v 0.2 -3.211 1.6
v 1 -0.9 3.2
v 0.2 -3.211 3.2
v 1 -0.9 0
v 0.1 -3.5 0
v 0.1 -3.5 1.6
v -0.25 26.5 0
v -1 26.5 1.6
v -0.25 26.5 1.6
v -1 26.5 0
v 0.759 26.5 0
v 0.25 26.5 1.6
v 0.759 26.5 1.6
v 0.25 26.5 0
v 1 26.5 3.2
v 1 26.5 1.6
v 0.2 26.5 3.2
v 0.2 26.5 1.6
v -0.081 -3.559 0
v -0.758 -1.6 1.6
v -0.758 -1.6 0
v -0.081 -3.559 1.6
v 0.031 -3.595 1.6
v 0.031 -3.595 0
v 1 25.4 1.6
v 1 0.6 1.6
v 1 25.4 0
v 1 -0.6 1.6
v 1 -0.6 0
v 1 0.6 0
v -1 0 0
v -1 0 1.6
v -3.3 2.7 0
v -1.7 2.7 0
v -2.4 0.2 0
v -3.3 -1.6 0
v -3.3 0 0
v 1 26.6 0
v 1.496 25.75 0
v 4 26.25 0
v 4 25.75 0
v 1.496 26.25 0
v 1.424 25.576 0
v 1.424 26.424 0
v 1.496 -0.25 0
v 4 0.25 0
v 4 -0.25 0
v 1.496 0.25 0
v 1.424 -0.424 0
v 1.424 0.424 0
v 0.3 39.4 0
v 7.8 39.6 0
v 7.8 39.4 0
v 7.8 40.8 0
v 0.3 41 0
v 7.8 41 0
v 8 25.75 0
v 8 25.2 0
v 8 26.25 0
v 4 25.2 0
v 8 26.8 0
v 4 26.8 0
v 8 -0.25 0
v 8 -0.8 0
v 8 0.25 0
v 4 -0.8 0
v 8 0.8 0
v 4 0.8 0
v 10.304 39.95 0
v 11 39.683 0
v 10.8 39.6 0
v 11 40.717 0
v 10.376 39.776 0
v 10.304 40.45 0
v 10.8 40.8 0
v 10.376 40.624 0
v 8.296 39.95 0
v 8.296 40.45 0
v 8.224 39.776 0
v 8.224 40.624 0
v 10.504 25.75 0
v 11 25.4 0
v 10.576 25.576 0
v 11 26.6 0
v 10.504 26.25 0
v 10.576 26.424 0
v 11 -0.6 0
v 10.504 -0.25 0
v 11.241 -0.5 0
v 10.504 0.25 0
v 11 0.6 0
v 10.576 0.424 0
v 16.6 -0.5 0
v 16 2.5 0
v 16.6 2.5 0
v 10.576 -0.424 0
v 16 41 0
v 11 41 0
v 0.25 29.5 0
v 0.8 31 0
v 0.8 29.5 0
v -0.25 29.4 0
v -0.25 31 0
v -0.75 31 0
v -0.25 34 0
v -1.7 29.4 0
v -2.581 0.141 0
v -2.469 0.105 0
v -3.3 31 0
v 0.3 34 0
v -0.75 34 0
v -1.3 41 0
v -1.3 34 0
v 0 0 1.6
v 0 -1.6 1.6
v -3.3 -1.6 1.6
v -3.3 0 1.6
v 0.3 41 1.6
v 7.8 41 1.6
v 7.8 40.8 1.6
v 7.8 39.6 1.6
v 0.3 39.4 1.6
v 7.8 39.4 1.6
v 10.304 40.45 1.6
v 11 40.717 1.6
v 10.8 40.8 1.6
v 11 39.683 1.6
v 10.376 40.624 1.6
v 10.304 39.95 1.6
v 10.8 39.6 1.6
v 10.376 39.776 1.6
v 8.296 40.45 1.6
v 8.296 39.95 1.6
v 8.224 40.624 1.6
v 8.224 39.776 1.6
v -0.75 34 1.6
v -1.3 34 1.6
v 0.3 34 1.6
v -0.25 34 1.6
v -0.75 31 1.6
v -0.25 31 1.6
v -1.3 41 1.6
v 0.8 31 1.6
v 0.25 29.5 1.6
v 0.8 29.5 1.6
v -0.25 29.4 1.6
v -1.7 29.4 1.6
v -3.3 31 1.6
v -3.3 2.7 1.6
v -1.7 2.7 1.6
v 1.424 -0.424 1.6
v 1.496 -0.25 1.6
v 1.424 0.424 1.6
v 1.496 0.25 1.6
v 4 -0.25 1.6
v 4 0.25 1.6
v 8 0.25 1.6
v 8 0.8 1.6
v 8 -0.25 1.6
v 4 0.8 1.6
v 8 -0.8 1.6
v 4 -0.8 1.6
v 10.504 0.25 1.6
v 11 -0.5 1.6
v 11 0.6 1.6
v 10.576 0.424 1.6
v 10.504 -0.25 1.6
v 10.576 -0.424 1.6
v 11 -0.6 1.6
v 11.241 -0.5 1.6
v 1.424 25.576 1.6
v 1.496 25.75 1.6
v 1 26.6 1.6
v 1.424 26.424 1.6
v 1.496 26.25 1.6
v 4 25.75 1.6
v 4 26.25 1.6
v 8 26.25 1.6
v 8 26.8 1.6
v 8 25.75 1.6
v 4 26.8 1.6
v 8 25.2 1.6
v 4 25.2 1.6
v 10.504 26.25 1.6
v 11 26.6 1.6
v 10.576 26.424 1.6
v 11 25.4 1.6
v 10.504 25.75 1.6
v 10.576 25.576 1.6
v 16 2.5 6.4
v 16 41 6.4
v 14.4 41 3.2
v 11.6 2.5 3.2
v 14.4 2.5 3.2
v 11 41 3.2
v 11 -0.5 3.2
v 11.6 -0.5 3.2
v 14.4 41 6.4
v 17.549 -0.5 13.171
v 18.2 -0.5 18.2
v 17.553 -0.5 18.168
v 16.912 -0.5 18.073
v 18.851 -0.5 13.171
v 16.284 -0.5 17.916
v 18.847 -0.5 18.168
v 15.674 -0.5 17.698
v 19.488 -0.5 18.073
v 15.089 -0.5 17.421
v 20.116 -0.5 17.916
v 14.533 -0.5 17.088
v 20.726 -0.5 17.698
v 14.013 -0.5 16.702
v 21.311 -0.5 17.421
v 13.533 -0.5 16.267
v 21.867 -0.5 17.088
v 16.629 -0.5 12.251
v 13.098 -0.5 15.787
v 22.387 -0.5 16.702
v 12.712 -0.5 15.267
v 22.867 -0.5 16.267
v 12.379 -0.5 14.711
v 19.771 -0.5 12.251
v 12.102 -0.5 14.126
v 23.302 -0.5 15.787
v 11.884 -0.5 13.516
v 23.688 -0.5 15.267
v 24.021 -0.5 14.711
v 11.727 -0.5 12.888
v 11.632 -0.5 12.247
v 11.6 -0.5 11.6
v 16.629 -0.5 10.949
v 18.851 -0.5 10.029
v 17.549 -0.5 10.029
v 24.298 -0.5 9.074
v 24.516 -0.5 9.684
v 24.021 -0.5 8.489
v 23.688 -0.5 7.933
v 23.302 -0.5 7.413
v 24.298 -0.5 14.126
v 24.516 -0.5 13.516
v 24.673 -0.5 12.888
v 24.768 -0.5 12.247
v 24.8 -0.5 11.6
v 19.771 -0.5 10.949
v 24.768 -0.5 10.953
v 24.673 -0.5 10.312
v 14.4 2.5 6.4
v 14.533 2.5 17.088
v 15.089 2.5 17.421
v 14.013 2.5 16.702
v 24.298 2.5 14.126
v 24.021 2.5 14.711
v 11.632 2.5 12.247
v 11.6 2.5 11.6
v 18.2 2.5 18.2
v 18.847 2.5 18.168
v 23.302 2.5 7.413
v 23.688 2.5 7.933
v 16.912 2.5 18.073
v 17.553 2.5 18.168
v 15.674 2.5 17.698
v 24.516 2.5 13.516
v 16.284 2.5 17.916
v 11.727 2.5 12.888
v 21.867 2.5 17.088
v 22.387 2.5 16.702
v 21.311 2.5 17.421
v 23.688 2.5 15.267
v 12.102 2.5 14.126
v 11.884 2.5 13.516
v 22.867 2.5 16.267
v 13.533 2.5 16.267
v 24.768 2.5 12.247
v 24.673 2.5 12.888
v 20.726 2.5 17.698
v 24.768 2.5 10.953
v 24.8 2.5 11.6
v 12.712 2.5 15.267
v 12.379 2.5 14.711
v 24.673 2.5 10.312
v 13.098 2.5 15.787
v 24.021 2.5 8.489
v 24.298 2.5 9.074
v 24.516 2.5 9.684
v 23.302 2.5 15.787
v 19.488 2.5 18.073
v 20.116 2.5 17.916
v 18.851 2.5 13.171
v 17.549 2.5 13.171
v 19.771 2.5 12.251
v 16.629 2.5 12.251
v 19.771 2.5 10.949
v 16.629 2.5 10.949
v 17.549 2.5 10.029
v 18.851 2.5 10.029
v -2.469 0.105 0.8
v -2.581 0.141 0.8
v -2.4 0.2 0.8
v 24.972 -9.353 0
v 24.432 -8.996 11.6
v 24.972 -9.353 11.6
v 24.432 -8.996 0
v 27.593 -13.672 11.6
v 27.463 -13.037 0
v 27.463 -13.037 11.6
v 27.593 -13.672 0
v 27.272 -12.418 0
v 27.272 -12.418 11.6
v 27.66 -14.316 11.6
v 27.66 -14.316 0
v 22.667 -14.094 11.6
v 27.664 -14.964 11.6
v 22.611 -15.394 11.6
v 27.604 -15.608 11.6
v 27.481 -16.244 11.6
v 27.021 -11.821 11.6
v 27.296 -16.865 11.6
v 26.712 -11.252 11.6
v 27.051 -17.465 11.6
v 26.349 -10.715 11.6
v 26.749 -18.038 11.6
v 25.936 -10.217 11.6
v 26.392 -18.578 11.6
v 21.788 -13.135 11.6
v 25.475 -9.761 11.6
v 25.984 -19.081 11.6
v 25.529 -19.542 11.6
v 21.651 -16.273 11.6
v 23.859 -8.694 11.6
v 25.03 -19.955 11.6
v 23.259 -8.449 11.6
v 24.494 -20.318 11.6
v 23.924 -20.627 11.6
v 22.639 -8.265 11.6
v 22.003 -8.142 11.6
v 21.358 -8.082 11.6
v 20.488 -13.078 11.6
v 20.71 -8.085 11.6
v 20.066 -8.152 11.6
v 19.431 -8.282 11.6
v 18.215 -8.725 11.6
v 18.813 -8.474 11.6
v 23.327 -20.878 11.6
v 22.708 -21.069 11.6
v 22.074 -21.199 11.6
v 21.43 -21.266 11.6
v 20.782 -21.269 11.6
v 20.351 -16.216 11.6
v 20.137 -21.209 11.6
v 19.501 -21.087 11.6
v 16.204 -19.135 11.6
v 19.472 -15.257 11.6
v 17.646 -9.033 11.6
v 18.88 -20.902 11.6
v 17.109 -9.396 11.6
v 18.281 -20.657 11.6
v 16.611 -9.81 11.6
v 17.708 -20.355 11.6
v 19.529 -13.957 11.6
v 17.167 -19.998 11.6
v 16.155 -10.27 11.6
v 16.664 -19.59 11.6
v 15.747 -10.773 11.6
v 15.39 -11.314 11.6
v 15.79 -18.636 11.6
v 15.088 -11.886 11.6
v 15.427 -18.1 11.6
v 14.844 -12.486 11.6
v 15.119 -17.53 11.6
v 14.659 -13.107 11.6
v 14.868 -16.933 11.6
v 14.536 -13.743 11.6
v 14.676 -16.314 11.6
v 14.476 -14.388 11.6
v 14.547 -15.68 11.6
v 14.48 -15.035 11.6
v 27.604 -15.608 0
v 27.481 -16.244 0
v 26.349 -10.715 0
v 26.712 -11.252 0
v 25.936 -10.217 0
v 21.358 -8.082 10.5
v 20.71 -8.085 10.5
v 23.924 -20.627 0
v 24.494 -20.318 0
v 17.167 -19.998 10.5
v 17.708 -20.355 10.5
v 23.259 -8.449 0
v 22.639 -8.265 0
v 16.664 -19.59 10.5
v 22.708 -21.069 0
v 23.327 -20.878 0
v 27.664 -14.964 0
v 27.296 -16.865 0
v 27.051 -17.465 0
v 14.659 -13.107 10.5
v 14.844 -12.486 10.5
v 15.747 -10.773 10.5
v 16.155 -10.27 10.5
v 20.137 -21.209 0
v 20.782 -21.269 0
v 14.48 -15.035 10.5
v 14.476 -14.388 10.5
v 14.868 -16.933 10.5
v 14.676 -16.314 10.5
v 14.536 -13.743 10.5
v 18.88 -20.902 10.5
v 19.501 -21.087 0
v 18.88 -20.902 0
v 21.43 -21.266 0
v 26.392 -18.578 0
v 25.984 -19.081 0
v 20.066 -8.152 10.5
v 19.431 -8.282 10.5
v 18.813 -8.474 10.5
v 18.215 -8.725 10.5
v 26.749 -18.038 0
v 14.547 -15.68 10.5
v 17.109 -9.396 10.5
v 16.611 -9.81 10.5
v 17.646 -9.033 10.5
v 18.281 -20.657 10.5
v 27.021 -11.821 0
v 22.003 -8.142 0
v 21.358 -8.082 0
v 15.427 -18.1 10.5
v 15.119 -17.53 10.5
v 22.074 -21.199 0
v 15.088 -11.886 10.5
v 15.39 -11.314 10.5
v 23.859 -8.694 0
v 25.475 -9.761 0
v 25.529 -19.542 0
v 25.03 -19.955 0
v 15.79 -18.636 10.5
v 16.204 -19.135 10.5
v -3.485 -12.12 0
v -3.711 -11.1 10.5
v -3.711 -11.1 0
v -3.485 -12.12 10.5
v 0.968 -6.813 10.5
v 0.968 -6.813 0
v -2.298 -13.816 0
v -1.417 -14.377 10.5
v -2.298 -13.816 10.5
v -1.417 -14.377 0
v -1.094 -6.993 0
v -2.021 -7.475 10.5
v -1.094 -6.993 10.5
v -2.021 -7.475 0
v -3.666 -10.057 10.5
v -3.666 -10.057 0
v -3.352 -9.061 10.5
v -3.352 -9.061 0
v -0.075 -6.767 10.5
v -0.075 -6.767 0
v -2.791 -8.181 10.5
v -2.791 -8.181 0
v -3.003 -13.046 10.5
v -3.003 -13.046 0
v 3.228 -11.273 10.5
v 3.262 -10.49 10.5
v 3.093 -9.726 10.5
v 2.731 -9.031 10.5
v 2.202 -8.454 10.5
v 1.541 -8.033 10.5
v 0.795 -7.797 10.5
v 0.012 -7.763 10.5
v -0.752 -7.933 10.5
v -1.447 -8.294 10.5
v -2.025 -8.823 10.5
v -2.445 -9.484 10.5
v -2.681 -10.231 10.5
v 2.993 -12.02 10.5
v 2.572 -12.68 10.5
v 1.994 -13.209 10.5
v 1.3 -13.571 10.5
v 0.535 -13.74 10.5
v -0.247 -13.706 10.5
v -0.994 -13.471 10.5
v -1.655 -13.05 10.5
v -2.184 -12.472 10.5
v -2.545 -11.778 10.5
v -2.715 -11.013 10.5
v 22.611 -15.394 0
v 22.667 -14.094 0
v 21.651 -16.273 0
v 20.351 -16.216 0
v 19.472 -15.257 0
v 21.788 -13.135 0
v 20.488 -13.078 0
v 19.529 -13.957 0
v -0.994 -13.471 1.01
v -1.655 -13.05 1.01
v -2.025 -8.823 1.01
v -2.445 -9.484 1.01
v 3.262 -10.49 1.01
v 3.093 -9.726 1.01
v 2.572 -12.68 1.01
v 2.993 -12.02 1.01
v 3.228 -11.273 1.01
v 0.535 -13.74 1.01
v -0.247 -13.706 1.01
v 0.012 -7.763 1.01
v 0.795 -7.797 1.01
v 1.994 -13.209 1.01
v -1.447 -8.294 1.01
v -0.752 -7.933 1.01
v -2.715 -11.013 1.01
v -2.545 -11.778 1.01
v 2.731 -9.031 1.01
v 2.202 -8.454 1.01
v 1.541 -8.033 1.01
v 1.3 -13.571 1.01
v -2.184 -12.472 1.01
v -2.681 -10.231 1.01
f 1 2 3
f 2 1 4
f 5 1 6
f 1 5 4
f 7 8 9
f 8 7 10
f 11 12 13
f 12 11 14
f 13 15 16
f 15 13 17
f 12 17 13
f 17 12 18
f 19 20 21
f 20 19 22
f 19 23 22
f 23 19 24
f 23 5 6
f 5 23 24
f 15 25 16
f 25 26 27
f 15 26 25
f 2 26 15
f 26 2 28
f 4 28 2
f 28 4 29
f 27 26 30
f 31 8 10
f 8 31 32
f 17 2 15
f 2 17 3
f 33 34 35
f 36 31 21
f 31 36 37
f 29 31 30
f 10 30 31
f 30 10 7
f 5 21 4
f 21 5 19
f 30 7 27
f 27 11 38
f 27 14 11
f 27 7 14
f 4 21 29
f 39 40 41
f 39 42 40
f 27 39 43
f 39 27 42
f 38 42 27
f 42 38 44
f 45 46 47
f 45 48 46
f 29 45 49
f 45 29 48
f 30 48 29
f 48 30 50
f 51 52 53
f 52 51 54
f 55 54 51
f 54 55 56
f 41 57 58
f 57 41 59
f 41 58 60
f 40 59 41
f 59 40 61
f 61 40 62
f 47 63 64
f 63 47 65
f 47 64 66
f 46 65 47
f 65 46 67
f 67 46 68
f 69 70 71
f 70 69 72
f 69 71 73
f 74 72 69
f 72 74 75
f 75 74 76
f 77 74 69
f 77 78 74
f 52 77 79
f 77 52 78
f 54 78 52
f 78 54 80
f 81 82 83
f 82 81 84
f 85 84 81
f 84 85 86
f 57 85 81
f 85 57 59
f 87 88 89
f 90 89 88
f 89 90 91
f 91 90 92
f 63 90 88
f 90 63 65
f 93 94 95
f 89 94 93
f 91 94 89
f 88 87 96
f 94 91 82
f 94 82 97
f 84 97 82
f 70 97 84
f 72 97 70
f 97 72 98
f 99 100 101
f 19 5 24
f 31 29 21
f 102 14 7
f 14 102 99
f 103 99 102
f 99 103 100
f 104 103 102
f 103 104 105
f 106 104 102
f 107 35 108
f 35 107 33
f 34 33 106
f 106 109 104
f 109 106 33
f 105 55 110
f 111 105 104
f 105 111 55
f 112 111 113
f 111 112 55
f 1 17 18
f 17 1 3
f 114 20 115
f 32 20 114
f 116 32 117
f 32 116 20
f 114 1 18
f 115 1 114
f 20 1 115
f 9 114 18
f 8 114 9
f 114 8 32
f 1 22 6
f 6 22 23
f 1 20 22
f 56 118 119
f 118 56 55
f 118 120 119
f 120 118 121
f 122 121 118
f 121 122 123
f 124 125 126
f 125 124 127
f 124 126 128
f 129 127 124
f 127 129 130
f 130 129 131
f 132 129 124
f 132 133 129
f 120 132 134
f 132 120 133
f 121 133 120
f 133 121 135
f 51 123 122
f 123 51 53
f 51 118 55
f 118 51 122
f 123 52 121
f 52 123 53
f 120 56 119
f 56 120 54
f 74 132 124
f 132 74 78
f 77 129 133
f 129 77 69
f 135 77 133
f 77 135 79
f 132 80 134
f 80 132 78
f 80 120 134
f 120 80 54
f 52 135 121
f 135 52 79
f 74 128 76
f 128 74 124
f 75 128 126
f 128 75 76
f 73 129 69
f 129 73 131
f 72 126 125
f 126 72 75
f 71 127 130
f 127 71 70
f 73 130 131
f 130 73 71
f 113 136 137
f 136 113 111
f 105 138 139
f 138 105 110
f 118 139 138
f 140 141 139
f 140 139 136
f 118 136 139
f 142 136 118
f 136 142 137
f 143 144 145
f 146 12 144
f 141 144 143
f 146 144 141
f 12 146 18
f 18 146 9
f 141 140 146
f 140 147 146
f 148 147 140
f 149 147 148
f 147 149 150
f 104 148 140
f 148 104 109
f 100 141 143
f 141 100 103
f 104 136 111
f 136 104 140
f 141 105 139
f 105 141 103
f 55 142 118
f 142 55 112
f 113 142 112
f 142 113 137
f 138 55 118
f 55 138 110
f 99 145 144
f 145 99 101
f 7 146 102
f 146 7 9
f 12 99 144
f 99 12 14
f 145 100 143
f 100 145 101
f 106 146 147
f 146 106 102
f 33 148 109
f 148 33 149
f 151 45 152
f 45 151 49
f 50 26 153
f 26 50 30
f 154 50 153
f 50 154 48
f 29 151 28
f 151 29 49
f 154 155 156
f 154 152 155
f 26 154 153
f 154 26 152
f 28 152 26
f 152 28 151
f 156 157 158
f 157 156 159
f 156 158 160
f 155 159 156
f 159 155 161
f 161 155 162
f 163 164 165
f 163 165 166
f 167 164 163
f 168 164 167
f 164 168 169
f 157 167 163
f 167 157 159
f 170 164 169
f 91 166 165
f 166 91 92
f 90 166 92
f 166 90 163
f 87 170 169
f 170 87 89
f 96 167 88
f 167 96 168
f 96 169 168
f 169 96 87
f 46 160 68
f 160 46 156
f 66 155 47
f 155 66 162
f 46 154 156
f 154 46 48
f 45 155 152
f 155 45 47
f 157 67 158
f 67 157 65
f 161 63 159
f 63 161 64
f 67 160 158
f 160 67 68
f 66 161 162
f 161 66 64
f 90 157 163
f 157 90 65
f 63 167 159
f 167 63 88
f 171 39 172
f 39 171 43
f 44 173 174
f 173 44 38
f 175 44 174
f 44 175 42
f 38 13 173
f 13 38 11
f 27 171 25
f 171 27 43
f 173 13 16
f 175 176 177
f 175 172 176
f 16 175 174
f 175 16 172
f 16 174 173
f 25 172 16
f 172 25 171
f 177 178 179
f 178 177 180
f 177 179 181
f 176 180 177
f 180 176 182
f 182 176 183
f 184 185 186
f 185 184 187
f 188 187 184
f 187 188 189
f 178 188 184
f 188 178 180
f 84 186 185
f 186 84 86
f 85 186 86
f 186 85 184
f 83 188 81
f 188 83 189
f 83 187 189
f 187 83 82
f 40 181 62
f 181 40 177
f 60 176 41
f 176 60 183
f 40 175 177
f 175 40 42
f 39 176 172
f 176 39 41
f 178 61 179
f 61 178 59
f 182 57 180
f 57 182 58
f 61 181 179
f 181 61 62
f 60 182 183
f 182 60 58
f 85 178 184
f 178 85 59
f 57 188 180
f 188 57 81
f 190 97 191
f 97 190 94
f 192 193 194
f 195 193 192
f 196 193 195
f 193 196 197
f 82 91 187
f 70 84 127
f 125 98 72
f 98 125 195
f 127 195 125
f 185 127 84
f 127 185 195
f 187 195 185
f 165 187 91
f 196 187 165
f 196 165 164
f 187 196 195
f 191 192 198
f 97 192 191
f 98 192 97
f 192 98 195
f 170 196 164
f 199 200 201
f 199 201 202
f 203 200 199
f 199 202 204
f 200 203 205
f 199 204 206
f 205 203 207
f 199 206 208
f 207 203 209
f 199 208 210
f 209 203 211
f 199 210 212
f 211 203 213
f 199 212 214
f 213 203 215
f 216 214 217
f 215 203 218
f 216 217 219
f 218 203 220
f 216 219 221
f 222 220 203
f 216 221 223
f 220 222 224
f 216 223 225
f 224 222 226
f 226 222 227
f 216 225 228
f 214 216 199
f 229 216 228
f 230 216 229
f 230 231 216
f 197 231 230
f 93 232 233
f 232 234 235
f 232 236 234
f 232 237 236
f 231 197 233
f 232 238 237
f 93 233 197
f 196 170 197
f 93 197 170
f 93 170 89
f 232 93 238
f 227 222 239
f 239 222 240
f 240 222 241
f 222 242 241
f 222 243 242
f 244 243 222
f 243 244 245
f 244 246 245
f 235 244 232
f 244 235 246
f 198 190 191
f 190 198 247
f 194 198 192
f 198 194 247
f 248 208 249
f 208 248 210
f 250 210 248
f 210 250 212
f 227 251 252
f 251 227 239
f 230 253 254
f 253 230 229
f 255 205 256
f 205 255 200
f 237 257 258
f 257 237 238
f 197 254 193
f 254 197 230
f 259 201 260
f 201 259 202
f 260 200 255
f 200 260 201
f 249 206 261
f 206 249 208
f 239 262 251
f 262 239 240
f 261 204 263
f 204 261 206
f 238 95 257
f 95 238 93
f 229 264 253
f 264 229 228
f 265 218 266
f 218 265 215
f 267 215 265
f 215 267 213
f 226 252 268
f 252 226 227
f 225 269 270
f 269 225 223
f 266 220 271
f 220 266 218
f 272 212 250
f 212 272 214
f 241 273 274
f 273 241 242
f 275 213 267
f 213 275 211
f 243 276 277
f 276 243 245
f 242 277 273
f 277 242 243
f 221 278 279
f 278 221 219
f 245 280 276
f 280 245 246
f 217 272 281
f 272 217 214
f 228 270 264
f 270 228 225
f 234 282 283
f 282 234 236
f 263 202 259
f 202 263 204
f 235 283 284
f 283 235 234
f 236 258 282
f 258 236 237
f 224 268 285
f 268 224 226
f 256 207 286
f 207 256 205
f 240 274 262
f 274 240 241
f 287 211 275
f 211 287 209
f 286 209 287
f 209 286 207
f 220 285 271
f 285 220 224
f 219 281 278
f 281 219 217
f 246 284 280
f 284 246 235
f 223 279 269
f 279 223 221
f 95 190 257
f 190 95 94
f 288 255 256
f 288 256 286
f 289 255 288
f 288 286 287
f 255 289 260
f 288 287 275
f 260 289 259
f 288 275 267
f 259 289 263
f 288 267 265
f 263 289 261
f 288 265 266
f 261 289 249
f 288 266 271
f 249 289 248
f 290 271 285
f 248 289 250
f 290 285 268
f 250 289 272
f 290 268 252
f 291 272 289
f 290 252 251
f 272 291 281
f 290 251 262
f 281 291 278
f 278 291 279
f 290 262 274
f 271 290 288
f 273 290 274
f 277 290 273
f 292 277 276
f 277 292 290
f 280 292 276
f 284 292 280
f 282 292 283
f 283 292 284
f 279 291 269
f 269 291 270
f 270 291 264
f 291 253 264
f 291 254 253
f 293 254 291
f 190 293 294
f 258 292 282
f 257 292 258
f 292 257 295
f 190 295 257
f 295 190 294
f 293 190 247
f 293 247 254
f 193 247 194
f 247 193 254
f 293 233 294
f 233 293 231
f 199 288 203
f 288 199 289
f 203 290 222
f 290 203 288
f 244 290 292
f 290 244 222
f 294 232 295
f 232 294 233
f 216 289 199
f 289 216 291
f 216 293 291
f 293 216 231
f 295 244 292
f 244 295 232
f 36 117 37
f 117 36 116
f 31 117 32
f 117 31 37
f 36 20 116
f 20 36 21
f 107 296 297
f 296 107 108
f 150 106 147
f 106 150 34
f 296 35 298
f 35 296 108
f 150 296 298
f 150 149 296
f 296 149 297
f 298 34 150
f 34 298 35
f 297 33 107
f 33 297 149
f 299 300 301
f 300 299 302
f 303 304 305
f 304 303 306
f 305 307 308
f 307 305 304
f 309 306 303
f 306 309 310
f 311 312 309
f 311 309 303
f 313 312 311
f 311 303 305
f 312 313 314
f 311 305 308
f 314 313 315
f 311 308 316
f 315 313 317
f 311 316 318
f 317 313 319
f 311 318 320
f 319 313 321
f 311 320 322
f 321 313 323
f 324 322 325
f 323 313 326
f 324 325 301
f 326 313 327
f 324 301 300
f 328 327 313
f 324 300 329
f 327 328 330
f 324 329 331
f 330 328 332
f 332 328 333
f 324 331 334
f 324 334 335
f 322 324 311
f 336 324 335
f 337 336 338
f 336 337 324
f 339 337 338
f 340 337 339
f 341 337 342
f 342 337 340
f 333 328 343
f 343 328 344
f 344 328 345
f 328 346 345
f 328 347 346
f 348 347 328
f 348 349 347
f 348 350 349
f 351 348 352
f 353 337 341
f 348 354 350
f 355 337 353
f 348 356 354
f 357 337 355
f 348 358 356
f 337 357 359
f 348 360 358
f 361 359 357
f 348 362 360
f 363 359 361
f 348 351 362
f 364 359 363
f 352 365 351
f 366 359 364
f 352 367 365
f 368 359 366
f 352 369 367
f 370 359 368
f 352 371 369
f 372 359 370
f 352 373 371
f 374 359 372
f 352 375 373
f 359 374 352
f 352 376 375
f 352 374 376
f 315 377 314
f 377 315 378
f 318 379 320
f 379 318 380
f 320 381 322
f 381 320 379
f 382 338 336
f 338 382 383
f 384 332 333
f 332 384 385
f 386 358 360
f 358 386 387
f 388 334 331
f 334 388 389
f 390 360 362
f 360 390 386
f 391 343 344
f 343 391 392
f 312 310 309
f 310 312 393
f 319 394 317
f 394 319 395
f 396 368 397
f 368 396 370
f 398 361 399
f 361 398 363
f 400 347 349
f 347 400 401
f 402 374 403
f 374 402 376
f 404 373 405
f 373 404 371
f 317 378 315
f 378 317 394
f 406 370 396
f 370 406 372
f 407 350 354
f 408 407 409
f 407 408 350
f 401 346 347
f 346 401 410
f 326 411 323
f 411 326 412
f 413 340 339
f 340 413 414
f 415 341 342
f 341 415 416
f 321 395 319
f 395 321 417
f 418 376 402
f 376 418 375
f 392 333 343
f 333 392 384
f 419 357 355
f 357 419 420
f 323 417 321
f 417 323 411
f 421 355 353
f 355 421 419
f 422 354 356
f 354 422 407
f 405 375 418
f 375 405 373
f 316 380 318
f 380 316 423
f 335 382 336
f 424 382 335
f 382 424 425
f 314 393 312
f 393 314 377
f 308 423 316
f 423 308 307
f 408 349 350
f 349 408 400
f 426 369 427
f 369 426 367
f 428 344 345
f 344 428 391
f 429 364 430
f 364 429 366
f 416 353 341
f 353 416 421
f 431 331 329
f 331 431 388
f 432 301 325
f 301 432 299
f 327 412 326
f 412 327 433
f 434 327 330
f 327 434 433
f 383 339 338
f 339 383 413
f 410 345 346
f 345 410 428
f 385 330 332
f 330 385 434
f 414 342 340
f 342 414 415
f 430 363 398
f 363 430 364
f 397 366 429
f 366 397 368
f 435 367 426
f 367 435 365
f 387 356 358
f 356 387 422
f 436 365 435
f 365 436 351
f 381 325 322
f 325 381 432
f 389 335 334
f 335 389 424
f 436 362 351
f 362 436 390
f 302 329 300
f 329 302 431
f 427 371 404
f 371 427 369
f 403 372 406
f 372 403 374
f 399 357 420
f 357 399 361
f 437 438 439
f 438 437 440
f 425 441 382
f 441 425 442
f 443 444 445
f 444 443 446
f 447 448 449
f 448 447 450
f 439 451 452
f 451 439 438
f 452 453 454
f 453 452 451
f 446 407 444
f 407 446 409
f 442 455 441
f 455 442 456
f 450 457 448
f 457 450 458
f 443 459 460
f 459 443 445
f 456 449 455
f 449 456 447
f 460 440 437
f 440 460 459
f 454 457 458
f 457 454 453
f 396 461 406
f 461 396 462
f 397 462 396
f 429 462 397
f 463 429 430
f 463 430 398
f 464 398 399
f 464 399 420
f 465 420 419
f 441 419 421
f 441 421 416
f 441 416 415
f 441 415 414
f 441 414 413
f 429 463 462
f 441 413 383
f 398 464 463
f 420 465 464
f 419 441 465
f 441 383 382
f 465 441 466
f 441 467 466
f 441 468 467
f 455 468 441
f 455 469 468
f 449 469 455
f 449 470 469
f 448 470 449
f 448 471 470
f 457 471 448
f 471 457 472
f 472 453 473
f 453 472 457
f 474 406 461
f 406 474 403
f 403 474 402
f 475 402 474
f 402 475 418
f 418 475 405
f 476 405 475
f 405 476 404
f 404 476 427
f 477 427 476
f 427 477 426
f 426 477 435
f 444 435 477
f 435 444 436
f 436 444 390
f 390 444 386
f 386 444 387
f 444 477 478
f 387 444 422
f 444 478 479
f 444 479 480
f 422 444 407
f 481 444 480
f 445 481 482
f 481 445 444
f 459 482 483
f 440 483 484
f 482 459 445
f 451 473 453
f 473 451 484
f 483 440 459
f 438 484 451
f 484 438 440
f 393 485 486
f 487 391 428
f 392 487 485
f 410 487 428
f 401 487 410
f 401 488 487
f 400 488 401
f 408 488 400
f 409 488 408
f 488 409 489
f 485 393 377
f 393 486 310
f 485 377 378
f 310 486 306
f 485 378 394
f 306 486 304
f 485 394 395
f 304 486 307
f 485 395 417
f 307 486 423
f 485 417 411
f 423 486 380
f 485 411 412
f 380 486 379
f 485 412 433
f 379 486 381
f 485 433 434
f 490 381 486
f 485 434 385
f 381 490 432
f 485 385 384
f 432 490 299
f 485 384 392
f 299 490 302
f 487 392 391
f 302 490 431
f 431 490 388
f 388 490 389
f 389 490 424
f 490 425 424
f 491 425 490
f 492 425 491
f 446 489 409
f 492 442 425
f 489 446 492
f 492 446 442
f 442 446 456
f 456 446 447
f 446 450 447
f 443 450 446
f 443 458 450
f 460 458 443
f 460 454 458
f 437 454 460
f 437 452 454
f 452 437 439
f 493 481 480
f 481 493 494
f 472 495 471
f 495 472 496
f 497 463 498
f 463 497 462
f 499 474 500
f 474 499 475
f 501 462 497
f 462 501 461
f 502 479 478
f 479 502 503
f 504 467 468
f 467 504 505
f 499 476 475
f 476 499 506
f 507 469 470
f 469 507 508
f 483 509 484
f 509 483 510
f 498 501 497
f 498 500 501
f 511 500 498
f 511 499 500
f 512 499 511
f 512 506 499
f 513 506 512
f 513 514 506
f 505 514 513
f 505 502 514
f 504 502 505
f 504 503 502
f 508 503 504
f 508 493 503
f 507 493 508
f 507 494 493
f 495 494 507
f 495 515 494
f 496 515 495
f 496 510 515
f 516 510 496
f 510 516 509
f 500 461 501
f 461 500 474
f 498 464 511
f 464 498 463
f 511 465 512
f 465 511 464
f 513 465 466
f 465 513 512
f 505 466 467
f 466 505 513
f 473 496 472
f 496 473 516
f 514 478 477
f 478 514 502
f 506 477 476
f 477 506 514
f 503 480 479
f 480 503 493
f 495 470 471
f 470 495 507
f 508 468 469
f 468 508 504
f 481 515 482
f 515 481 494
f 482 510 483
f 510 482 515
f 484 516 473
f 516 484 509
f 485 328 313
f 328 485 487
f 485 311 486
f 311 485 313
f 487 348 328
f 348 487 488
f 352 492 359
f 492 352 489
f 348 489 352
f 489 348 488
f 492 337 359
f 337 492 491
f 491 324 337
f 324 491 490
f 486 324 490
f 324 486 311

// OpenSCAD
// pika_touch_probe.scad - Scott-Russell flexure touch inidicator for attaching to PIKA Z Axis Driver
// This one has a wire probe point attached to it
// (C)2026 vik@diamondage.co.nz GPLv3 or later applies

flexure_thick=0.5;
flexure_length=3;
body_height=1.6;
small_gap=0.1;      // Smallest gap we can reliably print

wire_probe_rad=0.2;     // Wire probe tip that nestles in the point.
probe_length=3.5;
probe_width=2;
probe_height=body_height*2;     // This is the maximim height of the probe, giving room for tip.
probe_hinge_length=10;
probe_hinge_sep=26;
point_length=probe_width*1.3;
hinge_width=1.6;

first_joint_length=7.5;
first_joint_offset=0.5;
flag_clearance=1.5;
l_arm_length=10;
// This is the "handle" that all the flexures are attached to.
handle_length=probe_hinge_sep+first_joint_length+l_arm_length+2*flexure_thick-flexure_length;

handle_depth=5;    // Handle sticks out this much.
// The flag goes down to meet a protrusion stickign out just before the probe point
flag_length=flexure_length+probe_hinge_sep+hinge_width/2;

tab_rad=10/2+body_height;
tab_thick=3;
screw_rad=3.4/2;
tab_extends=tab_rad+1;

module flat_flexure() {
    translate([0,-flexure_thick/2,0])
        cube([flexure_length,flexure_thick,body_height]);
}

module probe_hinge() {
    // Blobs to encourage printer to join the flexure to things
    flexure_anchor();
    translate([probe_hinge_length,0,0]) flexure_anchor();
    flat_flexure();
    translate([flexure_length,-hinge_width/2,0])
        cube([probe_hinge_length-2*flexure_length,hinge_width,body_height]);
    translate([probe_hinge_length-flexure_length,0,0]) flat_flexure();
}

module flexure_anchor() {
    cylinder(h=body_height,r=flexure_thick*1.2,$fn=8);
}

l_base_arm_length=probe_hinge_length+first_joint_offset;
module l_arm() {
    flat_flexure();
    translate([flexure_length,-hinge_width/2,0])
        cube([l_arm_length-flexure_length,hinge_width,body_height]);
    translate([l_arm_length-hinge_width,flexure_length-probe_hinge_length-first_joint_offset-hinge_width/2,0]) {
        cube([hinge_width,probe_hinge_length+first_joint_offset-flexure_length,body_height]);
        // Flexure at far end of handle
        translate([hinge_width/2,0,0]) rotate([0,0,-90]) flat_flexure();
        // Anchors
        translate([hinge_width/2,0,0]) flexure_anchor();
        translate([hinge_width/2,-flexure_length,0]) flexure_anchor();
    }
}

// The first joint in the Stewart Russel flexure
stub_location=first_joint_length-hinge_width-flexure_length;
module first_joint() {
    rotate([0,0,90]) {
        flat_flexure();
        // Central pivoting part of Scott-Russel flexure
        translate([flexure_length,-hinge_width/2,0])
            cube([first_joint_length-2*flexure_length,hinge_width,body_height]);
        // L-shaped end hinge
        translate([first_joint_length-flexure_length,first_joint_offset,0]) l_arm();
        // Protruding stub for flag component
        translate([stub_location,0,0])
            cube([hinge_width,flag_clearance+probe_width/2+hinge_width/2,body_height]);
    }
}

// Perforated tab used to hold the fleures etc. to the Z Axis Driver's Probe Arm
 module attachment_tab(thickness=tab_thick) rotate([90,0,0]) {
    difference() {
        hull() {
            // Nice, smooth transition to the handle
            translate([tab_rad,handle_depth+tab_rad,0]) cylinder(h=thickness,r=tab_rad,$fn=64);
            cube([handle_depth,tab_thick,thickness]);
        }
        // Perforate for a screw
        translate([tab_rad,handle_depth+tab_rad,0]) rotate([0,0,180/8])
            cylinder(h=thickness*3,r=screw_rad,center=true,$fn=8);
    }
}

// The whole flexured probe holder assembly
module probe_holder_assembly() {
    // Sideways protrusion used as alignment scale
    translate([-flag_clearance-(probe_width+hinge_width)/2,-hinge_width,0])
        cube([flag_clearance+(hinge_width+probe_width)/2,hinge_width,body_height]);
    // Pointy probe bit. Has a half-tough chopped out for a probe wire.
    // This also stops adhesive going into the flexures...
    difference() {
        // Body of probe
        translate([0,-probe_length,0]) {
            hull() {
                // Pointy end
                cylinder(h=probe_height,r=0.1);
                // Main arm of probe
                translate([-probe_width/2,point_length,0])
                    cube([probe_width,probe_length+probe_hinge_sep+flexure_thick-point_length,probe_height]);
            }
        }
        // Cut half of the probe body away to leave a trough
        translate([wire_probe_rad-probe_width/2,0,body_height+probe_height/2])
            cube([probe_width,handle_length*4,probe_height],center=true);
    }

    // The flag arm
    translate([(-probe_width-hinge_width)/2-flag_clearance,small_gap,0])
        hull() {
            // Pointy end
            translate([hinge_width/2,0.1,0]) cylinder(h=body_height/2,r=0.1);
            translate([0,point_length,0]) cube([hinge_width,flag_length-point_length,body_height]);
        }


    // Flexure out front
    translate([0,probe_hinge_sep+flexure_thick,0])
            first_joint();
    // Two hinge flexuress anchoring the probe to the holder
    translate([probe_width/2,0,0]) probe_hinge();
    translate([probe_width/2,probe_hinge_sep,0]) probe_hinge();
    // The bit that holds on to the flexures
    translate([probe_hinge_length+probe_width/2,-flexure_thick,0]) {
        // Flat part attached to flexures
        cube([handle_depth,handle_length,body_height*2]);
        // Stiffening strip
        translate([handle_depth-body_height,0,0]) cube([body_height,handle_length,body_height*4]);
    }
    // Tab to attach to probe. Needs to be at roughly 90 degrees to the flexure
    translate([probe_hinge_length+hinge_width,tab_thick-flexure_thick,0]) 
        attachment_tab();
}

protective_wall_thick=1;    // Thickness of the protective edge around the cap and probe tip
protective_edge_height=2;
assumed_tip_length=6;
tip_cover_len=probe_length+assumed_tip_length+protective_wall_thick;
// A protective cover that allows the probe to be stored.
module probe_endcap() difference() {
    union() {
        // Tab to screw to the probe assembly.
        // Top part has a bit of a standoff
        translate([probe_hinge_length+hinge_width+tab_rad,-hinge_width-flexure_thick,tab_rad+handle_depth])
            rotate([90,0,0]) cylinder(h=hinge_width,r=tab_rad,$fn=64);
        // Bottom part is hullted to the tip cover
        hull() {
            translate([probe_hinge_length+hinge_width+tab_rad,-2*hinge_width,tab_rad+handle_depth])
                rotate([90,0,0]) cylinder(h=tip_cover_len,r=tab_rad,$fn=64);
            // Cover for the tip. Hinge_width here puts us below the arm sticking out of the tip
            translate([0,-2*hinge_width,probe_height/4]) rotate([90,0,0]) cylinder(h=tip_cover_len,r=probe_width+1+protective_wall_thick,$fn=24);
        }
    }
    // Hole for the tip to go into
    translate([0,0.01-2*hinge_width,probe_height/4]) rotate([90,0,0]) cylinder(h=probe_length+assumed_tip_length,r=probe_width+1,$fn=24);
    // Hole for an M3 screw
    translate([probe_hinge_length+hinge_width+tab_rad,-flexure_thick,tab_rad+handle_depth])
        rotate([90,0,0]) cylinder(h=1000,r=screw_rad,center=true,$fn=8);
}

probe_holder_assembly();
// Position the endcap to print flat and snug
translate([0,-10,2*hinge_width+tip_cover_len])
    rotate([90,0,20]) 
        probe_endcap();
